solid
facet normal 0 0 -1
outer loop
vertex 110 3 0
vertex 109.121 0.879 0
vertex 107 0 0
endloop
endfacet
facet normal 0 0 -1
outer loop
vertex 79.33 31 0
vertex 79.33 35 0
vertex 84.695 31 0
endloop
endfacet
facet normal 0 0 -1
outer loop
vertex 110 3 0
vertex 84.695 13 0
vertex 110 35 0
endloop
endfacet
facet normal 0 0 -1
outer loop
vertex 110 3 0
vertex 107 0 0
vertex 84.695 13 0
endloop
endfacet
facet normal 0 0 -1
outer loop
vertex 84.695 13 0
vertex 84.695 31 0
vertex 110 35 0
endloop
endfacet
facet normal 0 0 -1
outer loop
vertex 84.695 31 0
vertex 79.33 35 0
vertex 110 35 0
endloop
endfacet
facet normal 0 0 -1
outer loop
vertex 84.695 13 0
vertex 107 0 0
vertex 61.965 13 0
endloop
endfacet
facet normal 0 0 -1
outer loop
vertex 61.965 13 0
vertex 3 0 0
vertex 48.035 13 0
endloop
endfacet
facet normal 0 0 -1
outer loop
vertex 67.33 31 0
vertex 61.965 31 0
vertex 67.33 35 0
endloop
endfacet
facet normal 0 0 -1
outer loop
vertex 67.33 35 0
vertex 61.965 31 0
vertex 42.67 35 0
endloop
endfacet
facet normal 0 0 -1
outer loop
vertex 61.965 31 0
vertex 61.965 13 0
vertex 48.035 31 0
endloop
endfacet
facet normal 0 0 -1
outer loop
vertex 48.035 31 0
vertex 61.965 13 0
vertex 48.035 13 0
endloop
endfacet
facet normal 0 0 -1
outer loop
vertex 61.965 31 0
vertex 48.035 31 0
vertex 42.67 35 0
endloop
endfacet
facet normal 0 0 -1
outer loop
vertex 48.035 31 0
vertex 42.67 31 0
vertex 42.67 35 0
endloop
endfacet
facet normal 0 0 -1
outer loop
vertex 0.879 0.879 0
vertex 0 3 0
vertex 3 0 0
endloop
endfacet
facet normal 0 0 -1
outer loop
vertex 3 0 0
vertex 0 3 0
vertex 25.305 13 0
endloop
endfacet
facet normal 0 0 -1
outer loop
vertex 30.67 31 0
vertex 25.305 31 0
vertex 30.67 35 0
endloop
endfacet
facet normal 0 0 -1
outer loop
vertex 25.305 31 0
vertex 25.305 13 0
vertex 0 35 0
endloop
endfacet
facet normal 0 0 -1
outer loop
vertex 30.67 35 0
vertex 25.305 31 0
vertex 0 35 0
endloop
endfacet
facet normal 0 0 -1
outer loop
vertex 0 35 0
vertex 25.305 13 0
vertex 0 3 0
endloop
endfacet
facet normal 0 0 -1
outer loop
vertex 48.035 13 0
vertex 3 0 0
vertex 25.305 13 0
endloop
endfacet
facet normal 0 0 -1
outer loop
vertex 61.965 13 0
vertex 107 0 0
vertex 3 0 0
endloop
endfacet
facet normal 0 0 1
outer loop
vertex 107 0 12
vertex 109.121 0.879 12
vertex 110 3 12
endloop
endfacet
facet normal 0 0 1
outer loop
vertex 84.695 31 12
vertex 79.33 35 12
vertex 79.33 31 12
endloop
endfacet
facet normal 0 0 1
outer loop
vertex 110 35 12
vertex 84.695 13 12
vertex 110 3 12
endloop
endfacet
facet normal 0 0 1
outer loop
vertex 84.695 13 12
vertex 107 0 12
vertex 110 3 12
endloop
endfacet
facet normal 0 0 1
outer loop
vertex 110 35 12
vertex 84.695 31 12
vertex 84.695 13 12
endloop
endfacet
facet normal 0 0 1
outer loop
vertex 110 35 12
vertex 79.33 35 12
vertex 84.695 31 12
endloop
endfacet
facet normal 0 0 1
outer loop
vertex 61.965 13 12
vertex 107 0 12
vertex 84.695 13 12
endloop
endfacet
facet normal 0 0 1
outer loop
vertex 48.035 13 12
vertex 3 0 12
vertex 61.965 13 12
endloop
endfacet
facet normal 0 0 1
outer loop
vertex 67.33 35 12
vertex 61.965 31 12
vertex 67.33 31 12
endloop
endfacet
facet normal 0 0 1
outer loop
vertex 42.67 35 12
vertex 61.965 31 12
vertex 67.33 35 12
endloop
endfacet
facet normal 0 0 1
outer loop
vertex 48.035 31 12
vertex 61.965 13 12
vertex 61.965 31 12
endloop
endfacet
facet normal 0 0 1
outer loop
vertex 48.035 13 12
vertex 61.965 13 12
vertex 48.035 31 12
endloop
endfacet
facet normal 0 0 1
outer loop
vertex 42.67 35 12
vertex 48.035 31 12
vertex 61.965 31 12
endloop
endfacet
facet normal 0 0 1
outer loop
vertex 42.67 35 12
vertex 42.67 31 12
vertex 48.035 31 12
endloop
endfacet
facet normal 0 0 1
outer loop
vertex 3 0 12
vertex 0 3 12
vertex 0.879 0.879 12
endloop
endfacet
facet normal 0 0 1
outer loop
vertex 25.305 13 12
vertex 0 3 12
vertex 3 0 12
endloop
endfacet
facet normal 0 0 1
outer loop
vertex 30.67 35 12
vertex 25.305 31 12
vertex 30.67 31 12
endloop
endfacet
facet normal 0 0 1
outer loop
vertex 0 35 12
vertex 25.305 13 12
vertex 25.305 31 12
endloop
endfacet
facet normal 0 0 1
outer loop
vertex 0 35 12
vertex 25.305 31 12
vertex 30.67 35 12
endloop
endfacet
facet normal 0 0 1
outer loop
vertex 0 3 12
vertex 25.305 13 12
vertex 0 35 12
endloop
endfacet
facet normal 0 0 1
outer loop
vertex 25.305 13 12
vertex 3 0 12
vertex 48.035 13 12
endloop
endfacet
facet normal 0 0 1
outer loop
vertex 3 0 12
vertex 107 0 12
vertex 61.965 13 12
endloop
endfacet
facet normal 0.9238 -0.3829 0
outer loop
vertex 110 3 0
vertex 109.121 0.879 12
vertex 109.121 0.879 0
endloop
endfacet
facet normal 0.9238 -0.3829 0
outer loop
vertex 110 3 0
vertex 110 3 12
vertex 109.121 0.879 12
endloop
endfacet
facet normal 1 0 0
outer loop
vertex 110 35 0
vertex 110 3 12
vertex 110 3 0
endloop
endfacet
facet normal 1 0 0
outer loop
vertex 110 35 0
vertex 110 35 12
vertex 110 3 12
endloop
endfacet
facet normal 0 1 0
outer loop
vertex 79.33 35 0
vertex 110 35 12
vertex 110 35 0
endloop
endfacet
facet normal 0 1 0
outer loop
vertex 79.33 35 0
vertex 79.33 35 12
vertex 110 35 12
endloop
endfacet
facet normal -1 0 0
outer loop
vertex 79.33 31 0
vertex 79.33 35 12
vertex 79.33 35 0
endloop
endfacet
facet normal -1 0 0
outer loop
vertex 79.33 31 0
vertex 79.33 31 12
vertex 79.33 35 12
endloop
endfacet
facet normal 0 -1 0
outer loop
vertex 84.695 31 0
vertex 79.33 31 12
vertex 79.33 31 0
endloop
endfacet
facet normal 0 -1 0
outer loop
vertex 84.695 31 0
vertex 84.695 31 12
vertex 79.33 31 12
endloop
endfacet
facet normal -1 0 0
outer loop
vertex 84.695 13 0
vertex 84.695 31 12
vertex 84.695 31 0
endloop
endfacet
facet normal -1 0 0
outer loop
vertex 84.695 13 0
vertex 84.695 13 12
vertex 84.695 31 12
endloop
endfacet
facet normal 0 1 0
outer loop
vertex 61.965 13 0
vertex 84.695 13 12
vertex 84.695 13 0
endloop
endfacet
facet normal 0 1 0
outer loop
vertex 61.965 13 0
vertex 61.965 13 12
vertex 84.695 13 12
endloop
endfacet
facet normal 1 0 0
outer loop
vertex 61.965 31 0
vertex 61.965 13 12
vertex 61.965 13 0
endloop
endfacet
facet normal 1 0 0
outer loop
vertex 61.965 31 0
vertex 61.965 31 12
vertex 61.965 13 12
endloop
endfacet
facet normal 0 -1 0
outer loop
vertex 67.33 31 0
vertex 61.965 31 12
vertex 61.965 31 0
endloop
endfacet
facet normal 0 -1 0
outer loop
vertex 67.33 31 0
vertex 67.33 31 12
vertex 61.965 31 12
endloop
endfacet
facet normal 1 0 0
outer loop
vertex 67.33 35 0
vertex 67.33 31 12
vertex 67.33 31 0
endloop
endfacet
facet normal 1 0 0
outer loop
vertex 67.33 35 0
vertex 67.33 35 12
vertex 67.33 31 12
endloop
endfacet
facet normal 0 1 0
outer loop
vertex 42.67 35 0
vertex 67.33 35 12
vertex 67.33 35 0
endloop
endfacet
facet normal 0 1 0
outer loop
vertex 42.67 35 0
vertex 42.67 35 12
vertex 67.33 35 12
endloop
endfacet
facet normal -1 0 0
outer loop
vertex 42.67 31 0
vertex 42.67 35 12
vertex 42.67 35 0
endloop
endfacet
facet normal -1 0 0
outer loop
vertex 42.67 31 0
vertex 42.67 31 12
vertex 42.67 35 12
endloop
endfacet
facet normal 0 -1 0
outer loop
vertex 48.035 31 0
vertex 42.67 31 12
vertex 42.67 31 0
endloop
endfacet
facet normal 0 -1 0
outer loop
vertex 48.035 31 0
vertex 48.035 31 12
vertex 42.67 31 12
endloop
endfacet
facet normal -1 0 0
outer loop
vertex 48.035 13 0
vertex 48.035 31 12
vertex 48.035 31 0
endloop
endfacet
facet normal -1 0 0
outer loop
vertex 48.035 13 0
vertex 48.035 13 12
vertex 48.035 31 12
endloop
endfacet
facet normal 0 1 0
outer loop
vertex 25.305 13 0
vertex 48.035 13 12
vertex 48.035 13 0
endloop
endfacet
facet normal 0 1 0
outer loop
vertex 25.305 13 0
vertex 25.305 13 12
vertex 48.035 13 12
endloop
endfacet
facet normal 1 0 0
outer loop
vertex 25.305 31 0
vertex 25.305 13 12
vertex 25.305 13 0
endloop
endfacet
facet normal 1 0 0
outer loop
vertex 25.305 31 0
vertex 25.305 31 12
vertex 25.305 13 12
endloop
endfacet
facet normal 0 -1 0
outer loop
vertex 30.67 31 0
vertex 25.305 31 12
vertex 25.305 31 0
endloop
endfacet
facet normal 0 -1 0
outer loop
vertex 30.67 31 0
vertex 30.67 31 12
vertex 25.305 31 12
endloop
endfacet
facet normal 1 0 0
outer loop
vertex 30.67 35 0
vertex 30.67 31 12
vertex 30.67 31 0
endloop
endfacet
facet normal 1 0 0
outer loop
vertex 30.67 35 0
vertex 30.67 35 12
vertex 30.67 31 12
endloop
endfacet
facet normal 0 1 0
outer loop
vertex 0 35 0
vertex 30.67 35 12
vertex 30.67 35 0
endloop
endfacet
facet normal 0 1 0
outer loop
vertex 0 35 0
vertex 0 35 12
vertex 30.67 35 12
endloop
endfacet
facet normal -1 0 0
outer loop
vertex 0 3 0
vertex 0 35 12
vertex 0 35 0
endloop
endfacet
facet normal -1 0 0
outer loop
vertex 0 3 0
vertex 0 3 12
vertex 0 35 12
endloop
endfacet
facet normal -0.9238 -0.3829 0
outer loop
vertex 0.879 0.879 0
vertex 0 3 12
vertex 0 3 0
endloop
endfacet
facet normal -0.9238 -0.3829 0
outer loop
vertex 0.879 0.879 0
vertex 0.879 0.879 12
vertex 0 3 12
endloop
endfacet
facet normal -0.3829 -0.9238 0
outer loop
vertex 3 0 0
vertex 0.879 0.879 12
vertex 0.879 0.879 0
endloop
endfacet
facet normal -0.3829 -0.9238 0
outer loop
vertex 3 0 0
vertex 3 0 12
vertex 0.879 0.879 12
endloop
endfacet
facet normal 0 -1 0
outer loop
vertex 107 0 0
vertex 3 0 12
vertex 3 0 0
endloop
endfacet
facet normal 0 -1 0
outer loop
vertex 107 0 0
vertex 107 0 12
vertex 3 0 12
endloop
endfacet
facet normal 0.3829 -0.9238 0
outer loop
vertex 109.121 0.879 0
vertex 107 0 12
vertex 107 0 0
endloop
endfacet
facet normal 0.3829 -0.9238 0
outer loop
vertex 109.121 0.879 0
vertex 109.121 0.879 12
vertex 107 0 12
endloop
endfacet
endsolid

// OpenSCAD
$fn = 32;

// ----------------------------------------------------------------------
// Window plate: 110 x 35 mm, 2 open windows
// ----------------------------------------------------------------------

// --- parameters (mm) ---
profile_height = 12;      // extrusion height
profile_points = 24;      // points of the closed outline

profile = [[0, 3], [0.879, 0.879], [3, 0], [107, 0], [109.121, 0.879], [110, 3], [110, 35], [79.33, 35], [79.33, 31], [84.695, 31], [84.695, 13], [61.965, 13], [61.965, 31], [67.33, 31], [67.33, 35], [42.67, 35], [42.67, 31], [48.035, 31], [48.035, 13], [25.305, 13], [25.305, 31], [30.67, 31], [30.67, 35], [0, 35]];  // single closed polygon, 24 points, counter clockwise

// --- the one profile operation ---
linear_extrude(height = profile_height) polygon(points = profile);
